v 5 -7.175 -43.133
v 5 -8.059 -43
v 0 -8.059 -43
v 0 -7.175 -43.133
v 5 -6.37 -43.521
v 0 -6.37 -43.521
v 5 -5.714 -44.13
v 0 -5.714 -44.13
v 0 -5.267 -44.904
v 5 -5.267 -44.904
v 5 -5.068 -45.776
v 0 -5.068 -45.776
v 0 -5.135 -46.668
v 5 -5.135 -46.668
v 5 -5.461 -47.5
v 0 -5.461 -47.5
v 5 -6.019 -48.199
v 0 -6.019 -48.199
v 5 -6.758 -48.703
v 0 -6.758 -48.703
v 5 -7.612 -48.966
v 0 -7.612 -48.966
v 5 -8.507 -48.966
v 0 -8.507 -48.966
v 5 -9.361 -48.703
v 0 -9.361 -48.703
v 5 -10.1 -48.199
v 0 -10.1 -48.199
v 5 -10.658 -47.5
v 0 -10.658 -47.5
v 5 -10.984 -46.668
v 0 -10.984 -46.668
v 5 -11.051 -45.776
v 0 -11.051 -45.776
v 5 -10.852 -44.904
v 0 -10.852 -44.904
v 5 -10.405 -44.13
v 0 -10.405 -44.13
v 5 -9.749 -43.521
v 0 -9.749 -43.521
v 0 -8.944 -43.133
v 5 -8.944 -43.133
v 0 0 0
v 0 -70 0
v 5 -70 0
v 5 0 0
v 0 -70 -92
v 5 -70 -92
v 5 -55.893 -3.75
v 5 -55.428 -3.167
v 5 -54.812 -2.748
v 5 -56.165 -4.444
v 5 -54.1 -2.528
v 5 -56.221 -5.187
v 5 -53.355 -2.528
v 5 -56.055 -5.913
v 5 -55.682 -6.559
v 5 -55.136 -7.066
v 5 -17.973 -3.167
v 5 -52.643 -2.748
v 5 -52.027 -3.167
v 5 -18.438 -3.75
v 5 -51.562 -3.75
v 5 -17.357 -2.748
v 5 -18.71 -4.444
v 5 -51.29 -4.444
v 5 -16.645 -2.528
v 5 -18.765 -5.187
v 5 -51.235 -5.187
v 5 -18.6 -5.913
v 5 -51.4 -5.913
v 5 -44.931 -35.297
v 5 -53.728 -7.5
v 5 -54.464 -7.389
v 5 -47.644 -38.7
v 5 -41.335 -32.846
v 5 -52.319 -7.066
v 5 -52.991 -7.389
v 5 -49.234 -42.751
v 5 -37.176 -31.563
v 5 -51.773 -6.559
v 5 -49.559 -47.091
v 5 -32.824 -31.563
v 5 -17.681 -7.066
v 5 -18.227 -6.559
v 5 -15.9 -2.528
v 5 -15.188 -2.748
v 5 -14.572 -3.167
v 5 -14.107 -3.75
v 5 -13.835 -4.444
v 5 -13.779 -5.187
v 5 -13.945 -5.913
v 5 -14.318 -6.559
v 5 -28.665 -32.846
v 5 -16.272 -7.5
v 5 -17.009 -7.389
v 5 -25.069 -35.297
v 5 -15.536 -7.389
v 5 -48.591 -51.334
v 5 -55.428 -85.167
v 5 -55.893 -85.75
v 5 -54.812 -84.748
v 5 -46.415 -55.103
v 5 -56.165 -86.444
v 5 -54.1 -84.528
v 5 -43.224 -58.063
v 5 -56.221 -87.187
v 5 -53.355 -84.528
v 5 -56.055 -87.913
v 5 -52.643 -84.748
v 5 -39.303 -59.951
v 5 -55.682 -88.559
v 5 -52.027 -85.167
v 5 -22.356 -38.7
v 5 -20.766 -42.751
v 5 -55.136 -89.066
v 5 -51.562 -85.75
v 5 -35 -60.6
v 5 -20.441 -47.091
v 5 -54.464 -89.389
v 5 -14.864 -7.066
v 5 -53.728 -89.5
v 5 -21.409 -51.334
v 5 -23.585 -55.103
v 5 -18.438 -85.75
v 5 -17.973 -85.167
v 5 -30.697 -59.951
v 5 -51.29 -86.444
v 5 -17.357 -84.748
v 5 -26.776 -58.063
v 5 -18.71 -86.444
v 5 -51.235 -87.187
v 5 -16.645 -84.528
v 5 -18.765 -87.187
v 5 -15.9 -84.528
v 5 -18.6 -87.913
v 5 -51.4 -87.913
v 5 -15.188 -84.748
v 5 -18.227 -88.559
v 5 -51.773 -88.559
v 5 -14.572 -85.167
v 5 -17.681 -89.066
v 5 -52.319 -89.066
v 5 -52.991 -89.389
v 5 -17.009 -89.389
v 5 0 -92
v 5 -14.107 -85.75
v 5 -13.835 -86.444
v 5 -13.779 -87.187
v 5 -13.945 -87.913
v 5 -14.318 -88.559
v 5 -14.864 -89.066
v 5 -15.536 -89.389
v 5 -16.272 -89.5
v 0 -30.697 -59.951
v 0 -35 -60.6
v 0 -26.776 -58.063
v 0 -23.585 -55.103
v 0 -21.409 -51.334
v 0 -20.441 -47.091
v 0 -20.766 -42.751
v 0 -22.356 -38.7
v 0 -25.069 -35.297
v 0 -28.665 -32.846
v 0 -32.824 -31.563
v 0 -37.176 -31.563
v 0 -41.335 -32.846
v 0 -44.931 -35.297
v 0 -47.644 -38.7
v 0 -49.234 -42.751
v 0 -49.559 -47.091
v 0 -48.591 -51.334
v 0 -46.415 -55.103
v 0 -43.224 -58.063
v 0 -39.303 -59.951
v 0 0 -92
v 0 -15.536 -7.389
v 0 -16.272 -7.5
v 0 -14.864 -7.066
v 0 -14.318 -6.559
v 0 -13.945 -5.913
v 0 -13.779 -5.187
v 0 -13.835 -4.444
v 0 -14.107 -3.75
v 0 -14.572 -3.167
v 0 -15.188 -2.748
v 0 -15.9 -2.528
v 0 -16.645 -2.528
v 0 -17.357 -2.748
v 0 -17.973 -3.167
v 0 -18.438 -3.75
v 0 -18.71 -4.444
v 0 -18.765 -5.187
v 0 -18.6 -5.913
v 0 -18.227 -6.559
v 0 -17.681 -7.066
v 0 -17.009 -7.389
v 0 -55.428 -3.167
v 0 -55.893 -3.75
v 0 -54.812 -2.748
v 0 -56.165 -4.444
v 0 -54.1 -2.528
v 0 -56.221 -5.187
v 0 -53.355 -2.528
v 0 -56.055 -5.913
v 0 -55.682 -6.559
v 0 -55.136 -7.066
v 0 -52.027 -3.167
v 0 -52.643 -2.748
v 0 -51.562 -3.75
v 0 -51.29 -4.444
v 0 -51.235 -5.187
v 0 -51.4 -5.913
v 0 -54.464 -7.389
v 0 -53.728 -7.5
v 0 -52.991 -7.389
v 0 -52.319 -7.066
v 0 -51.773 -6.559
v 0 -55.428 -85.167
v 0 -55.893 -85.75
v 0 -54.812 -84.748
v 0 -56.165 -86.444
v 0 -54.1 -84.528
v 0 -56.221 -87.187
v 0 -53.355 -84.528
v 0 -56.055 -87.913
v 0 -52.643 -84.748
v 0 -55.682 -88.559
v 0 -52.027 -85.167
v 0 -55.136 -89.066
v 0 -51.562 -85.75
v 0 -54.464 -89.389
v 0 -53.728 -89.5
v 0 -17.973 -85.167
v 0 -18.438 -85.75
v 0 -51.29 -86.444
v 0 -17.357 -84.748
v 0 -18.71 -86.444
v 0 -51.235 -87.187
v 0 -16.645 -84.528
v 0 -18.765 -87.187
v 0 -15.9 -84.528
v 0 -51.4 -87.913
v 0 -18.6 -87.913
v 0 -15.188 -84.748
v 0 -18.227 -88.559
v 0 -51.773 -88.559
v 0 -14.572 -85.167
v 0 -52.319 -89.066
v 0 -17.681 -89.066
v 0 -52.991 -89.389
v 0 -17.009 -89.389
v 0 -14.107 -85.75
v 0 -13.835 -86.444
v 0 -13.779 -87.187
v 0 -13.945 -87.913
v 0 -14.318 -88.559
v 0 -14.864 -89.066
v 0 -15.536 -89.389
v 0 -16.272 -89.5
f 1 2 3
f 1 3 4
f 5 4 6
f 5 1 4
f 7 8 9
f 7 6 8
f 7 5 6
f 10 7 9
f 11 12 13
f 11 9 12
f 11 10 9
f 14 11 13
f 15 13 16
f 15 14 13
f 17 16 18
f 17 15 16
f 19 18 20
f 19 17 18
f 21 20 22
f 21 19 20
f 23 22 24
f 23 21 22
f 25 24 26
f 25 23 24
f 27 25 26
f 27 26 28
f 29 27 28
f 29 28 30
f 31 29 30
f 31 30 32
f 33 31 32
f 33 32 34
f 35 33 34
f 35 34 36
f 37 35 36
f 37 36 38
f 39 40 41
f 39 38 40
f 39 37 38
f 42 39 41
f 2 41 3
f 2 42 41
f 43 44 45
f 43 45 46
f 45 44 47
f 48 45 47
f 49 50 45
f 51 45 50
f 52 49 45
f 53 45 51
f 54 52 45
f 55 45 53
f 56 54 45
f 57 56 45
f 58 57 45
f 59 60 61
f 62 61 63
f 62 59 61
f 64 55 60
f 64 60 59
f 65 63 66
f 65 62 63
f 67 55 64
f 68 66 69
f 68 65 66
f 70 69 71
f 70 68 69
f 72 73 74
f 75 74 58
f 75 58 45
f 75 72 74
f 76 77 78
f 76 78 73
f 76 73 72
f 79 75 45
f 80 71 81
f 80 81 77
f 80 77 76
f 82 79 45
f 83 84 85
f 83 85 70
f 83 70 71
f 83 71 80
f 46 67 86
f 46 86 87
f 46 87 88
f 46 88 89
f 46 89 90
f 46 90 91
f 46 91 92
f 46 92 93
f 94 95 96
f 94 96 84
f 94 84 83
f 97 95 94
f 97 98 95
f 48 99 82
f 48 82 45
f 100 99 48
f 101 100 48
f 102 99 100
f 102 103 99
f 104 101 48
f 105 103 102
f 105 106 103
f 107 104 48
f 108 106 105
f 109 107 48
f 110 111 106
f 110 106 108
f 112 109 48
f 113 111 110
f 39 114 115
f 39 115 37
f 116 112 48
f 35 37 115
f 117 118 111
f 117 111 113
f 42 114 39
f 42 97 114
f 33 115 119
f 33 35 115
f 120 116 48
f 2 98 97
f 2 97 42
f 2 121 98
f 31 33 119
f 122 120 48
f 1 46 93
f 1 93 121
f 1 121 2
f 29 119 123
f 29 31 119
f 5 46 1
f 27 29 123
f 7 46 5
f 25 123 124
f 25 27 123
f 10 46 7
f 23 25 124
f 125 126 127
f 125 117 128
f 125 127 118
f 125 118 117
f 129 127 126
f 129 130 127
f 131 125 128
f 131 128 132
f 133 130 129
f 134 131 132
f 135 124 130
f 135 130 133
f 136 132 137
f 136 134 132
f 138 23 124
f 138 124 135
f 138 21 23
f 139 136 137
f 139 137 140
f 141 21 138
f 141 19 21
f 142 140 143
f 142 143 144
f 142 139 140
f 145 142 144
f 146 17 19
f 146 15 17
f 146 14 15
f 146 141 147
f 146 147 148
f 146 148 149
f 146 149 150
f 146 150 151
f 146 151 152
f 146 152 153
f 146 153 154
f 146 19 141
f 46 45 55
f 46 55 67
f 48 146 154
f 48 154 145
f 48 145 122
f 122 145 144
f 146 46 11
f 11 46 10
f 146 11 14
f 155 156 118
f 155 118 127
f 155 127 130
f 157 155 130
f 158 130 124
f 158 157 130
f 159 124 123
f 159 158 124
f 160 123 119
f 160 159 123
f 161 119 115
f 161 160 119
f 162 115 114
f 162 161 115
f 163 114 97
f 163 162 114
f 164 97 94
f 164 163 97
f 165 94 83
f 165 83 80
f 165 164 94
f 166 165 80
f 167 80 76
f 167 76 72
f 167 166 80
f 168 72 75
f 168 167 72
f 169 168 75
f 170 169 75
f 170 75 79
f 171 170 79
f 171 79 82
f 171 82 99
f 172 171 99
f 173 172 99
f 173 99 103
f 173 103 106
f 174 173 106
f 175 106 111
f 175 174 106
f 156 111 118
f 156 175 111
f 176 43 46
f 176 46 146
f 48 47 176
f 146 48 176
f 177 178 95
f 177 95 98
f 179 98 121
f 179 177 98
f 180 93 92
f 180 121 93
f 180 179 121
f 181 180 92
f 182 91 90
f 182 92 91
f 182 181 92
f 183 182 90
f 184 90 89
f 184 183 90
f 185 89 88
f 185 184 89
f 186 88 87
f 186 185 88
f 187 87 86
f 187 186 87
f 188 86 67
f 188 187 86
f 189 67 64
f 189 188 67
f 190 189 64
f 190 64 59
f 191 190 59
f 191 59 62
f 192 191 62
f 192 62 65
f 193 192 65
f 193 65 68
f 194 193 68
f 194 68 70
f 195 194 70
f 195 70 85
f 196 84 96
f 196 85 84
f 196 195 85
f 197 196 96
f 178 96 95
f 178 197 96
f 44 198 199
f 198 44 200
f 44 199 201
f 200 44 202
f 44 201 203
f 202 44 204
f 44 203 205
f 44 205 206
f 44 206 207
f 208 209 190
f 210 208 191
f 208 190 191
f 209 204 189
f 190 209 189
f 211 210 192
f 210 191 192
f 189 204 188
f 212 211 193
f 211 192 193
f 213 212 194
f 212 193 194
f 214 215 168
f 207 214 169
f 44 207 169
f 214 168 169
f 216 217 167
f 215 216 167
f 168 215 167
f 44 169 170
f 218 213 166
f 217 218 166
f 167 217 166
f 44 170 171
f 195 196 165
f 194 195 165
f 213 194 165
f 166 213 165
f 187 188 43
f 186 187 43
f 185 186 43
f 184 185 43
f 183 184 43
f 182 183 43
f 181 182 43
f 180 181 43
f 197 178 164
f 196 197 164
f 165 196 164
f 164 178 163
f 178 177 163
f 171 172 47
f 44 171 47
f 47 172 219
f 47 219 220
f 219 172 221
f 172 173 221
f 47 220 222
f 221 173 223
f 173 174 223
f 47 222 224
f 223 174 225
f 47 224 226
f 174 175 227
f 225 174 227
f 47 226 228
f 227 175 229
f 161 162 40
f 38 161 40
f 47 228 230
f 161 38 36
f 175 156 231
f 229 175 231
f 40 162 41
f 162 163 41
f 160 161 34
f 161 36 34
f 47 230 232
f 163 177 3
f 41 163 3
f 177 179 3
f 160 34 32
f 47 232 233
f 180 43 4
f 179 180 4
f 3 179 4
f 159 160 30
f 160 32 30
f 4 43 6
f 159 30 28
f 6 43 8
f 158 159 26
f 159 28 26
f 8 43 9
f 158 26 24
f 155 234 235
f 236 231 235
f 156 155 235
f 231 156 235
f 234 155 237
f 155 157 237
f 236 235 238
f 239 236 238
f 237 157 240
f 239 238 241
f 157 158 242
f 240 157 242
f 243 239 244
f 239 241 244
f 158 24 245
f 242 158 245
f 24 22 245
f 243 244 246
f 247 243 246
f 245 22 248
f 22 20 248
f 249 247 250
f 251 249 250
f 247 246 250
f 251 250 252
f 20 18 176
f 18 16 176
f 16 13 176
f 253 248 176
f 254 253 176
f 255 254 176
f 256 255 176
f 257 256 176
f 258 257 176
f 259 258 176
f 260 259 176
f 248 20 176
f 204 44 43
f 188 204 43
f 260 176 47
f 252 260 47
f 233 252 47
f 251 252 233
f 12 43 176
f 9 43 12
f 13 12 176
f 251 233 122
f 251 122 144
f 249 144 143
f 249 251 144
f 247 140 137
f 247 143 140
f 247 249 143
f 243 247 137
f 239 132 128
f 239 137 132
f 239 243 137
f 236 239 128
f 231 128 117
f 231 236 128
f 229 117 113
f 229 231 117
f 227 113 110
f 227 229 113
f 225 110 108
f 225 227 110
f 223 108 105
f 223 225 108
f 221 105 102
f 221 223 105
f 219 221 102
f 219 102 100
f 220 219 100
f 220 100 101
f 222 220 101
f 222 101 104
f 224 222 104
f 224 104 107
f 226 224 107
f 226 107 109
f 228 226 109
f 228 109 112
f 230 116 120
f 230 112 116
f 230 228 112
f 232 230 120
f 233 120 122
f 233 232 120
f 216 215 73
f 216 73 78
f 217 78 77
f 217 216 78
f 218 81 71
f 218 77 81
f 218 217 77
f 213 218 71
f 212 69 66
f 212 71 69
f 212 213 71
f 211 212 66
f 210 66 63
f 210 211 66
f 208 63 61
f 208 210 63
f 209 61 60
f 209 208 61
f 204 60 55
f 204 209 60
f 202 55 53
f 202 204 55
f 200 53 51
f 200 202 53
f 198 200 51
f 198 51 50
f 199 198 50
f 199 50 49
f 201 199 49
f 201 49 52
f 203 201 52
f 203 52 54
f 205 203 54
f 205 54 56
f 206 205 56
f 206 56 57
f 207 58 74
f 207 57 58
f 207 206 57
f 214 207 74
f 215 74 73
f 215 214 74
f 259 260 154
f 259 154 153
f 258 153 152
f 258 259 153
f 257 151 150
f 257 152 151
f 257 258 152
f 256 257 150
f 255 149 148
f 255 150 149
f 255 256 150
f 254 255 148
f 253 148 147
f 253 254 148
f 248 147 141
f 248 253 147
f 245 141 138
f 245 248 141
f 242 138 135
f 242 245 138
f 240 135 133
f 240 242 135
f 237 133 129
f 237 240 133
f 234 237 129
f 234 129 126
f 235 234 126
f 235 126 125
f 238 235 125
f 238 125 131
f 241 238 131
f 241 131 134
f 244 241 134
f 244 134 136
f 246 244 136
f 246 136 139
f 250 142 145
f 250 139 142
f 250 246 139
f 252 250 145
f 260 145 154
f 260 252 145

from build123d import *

# Parameters (mm, degrees)
SKETCH1_W               = 92
SKETCH1_H               = 70
SKETCH1_R               = 14.6
BOSS_EXTRUDE1_DEPTH     = 5
CUT_EXTRUDE1_DEPTH      = 116.71084651
CUT_EXTRUDE1_DEPTH_BACK = 116.71084651
SKETCH2_R               = 2.5
CUT_EXTRUDE2_DEPTH      = 116.71084651
CUT_EXTRUDE2_DEPTH_BACK = 116.71084651
SKETCH3_R               = 3


with BuildPart() as part:
    # Sketch1 → Boss-Extrude1 (new body)
    with BuildSketch(Plane(origin=(0, 0, 0), x_dir=(0, 0, -1), z_dir=(1, 0, 0))):
        with Locations((46, -35)):
            Rectangle(SKETCH1_W, SKETCH1_H)
        with Locations((46, -35)):
            Circle(SKETCH1_R, mode=Mode.SUBTRACT)
    extrude(amount=BOSS_EXTRUDE1_DEPTH)

    # Sketch2 → Cut-Extrude1 (cut, two sides: drawn at the far end of the back side and taken through both)
    with BuildSketch(Plane(origin=(5, 0, 0), x_dir=(0, 0, -1), z_dir=(1, 0, 0)).offset(-CUT_EXTRUDE1_DEPTH_BACK)):
        with Locations((5, -53.727554141)):
            Circle(SKETCH2_R)
        with Locations((5, -16.272445859)):
            Circle(SKETCH2_R)
        with Locations((87, -53.727554141)):
            Circle(SKETCH2_R)
        with Locations((87, -16.272445859)):
            Circle(SKETCH2_R)
    extrude(amount=CUT_EXTRUDE1_DEPTH + CUT_EXTRUDE1_DEPTH_BACK, mode=Mode.SUBTRACT)

    # Sketch3 → Cut-Extrude2 (cut, two sides: drawn at the far end of the back side and taken through both)
    with BuildSketch(Plane.ZY.offset(-CUT_EXTRUDE2_DEPTH_BACK)):
        with Locations((-46, -8.059478057)):
            Circle(SKETCH3_R)
    extrude(amount=CUT_EXTRUDE2_DEPTH + CUT_EXTRUDE2_DEPTH_BACK, mode=Mode.SUBTRACT)


solid = part.part
